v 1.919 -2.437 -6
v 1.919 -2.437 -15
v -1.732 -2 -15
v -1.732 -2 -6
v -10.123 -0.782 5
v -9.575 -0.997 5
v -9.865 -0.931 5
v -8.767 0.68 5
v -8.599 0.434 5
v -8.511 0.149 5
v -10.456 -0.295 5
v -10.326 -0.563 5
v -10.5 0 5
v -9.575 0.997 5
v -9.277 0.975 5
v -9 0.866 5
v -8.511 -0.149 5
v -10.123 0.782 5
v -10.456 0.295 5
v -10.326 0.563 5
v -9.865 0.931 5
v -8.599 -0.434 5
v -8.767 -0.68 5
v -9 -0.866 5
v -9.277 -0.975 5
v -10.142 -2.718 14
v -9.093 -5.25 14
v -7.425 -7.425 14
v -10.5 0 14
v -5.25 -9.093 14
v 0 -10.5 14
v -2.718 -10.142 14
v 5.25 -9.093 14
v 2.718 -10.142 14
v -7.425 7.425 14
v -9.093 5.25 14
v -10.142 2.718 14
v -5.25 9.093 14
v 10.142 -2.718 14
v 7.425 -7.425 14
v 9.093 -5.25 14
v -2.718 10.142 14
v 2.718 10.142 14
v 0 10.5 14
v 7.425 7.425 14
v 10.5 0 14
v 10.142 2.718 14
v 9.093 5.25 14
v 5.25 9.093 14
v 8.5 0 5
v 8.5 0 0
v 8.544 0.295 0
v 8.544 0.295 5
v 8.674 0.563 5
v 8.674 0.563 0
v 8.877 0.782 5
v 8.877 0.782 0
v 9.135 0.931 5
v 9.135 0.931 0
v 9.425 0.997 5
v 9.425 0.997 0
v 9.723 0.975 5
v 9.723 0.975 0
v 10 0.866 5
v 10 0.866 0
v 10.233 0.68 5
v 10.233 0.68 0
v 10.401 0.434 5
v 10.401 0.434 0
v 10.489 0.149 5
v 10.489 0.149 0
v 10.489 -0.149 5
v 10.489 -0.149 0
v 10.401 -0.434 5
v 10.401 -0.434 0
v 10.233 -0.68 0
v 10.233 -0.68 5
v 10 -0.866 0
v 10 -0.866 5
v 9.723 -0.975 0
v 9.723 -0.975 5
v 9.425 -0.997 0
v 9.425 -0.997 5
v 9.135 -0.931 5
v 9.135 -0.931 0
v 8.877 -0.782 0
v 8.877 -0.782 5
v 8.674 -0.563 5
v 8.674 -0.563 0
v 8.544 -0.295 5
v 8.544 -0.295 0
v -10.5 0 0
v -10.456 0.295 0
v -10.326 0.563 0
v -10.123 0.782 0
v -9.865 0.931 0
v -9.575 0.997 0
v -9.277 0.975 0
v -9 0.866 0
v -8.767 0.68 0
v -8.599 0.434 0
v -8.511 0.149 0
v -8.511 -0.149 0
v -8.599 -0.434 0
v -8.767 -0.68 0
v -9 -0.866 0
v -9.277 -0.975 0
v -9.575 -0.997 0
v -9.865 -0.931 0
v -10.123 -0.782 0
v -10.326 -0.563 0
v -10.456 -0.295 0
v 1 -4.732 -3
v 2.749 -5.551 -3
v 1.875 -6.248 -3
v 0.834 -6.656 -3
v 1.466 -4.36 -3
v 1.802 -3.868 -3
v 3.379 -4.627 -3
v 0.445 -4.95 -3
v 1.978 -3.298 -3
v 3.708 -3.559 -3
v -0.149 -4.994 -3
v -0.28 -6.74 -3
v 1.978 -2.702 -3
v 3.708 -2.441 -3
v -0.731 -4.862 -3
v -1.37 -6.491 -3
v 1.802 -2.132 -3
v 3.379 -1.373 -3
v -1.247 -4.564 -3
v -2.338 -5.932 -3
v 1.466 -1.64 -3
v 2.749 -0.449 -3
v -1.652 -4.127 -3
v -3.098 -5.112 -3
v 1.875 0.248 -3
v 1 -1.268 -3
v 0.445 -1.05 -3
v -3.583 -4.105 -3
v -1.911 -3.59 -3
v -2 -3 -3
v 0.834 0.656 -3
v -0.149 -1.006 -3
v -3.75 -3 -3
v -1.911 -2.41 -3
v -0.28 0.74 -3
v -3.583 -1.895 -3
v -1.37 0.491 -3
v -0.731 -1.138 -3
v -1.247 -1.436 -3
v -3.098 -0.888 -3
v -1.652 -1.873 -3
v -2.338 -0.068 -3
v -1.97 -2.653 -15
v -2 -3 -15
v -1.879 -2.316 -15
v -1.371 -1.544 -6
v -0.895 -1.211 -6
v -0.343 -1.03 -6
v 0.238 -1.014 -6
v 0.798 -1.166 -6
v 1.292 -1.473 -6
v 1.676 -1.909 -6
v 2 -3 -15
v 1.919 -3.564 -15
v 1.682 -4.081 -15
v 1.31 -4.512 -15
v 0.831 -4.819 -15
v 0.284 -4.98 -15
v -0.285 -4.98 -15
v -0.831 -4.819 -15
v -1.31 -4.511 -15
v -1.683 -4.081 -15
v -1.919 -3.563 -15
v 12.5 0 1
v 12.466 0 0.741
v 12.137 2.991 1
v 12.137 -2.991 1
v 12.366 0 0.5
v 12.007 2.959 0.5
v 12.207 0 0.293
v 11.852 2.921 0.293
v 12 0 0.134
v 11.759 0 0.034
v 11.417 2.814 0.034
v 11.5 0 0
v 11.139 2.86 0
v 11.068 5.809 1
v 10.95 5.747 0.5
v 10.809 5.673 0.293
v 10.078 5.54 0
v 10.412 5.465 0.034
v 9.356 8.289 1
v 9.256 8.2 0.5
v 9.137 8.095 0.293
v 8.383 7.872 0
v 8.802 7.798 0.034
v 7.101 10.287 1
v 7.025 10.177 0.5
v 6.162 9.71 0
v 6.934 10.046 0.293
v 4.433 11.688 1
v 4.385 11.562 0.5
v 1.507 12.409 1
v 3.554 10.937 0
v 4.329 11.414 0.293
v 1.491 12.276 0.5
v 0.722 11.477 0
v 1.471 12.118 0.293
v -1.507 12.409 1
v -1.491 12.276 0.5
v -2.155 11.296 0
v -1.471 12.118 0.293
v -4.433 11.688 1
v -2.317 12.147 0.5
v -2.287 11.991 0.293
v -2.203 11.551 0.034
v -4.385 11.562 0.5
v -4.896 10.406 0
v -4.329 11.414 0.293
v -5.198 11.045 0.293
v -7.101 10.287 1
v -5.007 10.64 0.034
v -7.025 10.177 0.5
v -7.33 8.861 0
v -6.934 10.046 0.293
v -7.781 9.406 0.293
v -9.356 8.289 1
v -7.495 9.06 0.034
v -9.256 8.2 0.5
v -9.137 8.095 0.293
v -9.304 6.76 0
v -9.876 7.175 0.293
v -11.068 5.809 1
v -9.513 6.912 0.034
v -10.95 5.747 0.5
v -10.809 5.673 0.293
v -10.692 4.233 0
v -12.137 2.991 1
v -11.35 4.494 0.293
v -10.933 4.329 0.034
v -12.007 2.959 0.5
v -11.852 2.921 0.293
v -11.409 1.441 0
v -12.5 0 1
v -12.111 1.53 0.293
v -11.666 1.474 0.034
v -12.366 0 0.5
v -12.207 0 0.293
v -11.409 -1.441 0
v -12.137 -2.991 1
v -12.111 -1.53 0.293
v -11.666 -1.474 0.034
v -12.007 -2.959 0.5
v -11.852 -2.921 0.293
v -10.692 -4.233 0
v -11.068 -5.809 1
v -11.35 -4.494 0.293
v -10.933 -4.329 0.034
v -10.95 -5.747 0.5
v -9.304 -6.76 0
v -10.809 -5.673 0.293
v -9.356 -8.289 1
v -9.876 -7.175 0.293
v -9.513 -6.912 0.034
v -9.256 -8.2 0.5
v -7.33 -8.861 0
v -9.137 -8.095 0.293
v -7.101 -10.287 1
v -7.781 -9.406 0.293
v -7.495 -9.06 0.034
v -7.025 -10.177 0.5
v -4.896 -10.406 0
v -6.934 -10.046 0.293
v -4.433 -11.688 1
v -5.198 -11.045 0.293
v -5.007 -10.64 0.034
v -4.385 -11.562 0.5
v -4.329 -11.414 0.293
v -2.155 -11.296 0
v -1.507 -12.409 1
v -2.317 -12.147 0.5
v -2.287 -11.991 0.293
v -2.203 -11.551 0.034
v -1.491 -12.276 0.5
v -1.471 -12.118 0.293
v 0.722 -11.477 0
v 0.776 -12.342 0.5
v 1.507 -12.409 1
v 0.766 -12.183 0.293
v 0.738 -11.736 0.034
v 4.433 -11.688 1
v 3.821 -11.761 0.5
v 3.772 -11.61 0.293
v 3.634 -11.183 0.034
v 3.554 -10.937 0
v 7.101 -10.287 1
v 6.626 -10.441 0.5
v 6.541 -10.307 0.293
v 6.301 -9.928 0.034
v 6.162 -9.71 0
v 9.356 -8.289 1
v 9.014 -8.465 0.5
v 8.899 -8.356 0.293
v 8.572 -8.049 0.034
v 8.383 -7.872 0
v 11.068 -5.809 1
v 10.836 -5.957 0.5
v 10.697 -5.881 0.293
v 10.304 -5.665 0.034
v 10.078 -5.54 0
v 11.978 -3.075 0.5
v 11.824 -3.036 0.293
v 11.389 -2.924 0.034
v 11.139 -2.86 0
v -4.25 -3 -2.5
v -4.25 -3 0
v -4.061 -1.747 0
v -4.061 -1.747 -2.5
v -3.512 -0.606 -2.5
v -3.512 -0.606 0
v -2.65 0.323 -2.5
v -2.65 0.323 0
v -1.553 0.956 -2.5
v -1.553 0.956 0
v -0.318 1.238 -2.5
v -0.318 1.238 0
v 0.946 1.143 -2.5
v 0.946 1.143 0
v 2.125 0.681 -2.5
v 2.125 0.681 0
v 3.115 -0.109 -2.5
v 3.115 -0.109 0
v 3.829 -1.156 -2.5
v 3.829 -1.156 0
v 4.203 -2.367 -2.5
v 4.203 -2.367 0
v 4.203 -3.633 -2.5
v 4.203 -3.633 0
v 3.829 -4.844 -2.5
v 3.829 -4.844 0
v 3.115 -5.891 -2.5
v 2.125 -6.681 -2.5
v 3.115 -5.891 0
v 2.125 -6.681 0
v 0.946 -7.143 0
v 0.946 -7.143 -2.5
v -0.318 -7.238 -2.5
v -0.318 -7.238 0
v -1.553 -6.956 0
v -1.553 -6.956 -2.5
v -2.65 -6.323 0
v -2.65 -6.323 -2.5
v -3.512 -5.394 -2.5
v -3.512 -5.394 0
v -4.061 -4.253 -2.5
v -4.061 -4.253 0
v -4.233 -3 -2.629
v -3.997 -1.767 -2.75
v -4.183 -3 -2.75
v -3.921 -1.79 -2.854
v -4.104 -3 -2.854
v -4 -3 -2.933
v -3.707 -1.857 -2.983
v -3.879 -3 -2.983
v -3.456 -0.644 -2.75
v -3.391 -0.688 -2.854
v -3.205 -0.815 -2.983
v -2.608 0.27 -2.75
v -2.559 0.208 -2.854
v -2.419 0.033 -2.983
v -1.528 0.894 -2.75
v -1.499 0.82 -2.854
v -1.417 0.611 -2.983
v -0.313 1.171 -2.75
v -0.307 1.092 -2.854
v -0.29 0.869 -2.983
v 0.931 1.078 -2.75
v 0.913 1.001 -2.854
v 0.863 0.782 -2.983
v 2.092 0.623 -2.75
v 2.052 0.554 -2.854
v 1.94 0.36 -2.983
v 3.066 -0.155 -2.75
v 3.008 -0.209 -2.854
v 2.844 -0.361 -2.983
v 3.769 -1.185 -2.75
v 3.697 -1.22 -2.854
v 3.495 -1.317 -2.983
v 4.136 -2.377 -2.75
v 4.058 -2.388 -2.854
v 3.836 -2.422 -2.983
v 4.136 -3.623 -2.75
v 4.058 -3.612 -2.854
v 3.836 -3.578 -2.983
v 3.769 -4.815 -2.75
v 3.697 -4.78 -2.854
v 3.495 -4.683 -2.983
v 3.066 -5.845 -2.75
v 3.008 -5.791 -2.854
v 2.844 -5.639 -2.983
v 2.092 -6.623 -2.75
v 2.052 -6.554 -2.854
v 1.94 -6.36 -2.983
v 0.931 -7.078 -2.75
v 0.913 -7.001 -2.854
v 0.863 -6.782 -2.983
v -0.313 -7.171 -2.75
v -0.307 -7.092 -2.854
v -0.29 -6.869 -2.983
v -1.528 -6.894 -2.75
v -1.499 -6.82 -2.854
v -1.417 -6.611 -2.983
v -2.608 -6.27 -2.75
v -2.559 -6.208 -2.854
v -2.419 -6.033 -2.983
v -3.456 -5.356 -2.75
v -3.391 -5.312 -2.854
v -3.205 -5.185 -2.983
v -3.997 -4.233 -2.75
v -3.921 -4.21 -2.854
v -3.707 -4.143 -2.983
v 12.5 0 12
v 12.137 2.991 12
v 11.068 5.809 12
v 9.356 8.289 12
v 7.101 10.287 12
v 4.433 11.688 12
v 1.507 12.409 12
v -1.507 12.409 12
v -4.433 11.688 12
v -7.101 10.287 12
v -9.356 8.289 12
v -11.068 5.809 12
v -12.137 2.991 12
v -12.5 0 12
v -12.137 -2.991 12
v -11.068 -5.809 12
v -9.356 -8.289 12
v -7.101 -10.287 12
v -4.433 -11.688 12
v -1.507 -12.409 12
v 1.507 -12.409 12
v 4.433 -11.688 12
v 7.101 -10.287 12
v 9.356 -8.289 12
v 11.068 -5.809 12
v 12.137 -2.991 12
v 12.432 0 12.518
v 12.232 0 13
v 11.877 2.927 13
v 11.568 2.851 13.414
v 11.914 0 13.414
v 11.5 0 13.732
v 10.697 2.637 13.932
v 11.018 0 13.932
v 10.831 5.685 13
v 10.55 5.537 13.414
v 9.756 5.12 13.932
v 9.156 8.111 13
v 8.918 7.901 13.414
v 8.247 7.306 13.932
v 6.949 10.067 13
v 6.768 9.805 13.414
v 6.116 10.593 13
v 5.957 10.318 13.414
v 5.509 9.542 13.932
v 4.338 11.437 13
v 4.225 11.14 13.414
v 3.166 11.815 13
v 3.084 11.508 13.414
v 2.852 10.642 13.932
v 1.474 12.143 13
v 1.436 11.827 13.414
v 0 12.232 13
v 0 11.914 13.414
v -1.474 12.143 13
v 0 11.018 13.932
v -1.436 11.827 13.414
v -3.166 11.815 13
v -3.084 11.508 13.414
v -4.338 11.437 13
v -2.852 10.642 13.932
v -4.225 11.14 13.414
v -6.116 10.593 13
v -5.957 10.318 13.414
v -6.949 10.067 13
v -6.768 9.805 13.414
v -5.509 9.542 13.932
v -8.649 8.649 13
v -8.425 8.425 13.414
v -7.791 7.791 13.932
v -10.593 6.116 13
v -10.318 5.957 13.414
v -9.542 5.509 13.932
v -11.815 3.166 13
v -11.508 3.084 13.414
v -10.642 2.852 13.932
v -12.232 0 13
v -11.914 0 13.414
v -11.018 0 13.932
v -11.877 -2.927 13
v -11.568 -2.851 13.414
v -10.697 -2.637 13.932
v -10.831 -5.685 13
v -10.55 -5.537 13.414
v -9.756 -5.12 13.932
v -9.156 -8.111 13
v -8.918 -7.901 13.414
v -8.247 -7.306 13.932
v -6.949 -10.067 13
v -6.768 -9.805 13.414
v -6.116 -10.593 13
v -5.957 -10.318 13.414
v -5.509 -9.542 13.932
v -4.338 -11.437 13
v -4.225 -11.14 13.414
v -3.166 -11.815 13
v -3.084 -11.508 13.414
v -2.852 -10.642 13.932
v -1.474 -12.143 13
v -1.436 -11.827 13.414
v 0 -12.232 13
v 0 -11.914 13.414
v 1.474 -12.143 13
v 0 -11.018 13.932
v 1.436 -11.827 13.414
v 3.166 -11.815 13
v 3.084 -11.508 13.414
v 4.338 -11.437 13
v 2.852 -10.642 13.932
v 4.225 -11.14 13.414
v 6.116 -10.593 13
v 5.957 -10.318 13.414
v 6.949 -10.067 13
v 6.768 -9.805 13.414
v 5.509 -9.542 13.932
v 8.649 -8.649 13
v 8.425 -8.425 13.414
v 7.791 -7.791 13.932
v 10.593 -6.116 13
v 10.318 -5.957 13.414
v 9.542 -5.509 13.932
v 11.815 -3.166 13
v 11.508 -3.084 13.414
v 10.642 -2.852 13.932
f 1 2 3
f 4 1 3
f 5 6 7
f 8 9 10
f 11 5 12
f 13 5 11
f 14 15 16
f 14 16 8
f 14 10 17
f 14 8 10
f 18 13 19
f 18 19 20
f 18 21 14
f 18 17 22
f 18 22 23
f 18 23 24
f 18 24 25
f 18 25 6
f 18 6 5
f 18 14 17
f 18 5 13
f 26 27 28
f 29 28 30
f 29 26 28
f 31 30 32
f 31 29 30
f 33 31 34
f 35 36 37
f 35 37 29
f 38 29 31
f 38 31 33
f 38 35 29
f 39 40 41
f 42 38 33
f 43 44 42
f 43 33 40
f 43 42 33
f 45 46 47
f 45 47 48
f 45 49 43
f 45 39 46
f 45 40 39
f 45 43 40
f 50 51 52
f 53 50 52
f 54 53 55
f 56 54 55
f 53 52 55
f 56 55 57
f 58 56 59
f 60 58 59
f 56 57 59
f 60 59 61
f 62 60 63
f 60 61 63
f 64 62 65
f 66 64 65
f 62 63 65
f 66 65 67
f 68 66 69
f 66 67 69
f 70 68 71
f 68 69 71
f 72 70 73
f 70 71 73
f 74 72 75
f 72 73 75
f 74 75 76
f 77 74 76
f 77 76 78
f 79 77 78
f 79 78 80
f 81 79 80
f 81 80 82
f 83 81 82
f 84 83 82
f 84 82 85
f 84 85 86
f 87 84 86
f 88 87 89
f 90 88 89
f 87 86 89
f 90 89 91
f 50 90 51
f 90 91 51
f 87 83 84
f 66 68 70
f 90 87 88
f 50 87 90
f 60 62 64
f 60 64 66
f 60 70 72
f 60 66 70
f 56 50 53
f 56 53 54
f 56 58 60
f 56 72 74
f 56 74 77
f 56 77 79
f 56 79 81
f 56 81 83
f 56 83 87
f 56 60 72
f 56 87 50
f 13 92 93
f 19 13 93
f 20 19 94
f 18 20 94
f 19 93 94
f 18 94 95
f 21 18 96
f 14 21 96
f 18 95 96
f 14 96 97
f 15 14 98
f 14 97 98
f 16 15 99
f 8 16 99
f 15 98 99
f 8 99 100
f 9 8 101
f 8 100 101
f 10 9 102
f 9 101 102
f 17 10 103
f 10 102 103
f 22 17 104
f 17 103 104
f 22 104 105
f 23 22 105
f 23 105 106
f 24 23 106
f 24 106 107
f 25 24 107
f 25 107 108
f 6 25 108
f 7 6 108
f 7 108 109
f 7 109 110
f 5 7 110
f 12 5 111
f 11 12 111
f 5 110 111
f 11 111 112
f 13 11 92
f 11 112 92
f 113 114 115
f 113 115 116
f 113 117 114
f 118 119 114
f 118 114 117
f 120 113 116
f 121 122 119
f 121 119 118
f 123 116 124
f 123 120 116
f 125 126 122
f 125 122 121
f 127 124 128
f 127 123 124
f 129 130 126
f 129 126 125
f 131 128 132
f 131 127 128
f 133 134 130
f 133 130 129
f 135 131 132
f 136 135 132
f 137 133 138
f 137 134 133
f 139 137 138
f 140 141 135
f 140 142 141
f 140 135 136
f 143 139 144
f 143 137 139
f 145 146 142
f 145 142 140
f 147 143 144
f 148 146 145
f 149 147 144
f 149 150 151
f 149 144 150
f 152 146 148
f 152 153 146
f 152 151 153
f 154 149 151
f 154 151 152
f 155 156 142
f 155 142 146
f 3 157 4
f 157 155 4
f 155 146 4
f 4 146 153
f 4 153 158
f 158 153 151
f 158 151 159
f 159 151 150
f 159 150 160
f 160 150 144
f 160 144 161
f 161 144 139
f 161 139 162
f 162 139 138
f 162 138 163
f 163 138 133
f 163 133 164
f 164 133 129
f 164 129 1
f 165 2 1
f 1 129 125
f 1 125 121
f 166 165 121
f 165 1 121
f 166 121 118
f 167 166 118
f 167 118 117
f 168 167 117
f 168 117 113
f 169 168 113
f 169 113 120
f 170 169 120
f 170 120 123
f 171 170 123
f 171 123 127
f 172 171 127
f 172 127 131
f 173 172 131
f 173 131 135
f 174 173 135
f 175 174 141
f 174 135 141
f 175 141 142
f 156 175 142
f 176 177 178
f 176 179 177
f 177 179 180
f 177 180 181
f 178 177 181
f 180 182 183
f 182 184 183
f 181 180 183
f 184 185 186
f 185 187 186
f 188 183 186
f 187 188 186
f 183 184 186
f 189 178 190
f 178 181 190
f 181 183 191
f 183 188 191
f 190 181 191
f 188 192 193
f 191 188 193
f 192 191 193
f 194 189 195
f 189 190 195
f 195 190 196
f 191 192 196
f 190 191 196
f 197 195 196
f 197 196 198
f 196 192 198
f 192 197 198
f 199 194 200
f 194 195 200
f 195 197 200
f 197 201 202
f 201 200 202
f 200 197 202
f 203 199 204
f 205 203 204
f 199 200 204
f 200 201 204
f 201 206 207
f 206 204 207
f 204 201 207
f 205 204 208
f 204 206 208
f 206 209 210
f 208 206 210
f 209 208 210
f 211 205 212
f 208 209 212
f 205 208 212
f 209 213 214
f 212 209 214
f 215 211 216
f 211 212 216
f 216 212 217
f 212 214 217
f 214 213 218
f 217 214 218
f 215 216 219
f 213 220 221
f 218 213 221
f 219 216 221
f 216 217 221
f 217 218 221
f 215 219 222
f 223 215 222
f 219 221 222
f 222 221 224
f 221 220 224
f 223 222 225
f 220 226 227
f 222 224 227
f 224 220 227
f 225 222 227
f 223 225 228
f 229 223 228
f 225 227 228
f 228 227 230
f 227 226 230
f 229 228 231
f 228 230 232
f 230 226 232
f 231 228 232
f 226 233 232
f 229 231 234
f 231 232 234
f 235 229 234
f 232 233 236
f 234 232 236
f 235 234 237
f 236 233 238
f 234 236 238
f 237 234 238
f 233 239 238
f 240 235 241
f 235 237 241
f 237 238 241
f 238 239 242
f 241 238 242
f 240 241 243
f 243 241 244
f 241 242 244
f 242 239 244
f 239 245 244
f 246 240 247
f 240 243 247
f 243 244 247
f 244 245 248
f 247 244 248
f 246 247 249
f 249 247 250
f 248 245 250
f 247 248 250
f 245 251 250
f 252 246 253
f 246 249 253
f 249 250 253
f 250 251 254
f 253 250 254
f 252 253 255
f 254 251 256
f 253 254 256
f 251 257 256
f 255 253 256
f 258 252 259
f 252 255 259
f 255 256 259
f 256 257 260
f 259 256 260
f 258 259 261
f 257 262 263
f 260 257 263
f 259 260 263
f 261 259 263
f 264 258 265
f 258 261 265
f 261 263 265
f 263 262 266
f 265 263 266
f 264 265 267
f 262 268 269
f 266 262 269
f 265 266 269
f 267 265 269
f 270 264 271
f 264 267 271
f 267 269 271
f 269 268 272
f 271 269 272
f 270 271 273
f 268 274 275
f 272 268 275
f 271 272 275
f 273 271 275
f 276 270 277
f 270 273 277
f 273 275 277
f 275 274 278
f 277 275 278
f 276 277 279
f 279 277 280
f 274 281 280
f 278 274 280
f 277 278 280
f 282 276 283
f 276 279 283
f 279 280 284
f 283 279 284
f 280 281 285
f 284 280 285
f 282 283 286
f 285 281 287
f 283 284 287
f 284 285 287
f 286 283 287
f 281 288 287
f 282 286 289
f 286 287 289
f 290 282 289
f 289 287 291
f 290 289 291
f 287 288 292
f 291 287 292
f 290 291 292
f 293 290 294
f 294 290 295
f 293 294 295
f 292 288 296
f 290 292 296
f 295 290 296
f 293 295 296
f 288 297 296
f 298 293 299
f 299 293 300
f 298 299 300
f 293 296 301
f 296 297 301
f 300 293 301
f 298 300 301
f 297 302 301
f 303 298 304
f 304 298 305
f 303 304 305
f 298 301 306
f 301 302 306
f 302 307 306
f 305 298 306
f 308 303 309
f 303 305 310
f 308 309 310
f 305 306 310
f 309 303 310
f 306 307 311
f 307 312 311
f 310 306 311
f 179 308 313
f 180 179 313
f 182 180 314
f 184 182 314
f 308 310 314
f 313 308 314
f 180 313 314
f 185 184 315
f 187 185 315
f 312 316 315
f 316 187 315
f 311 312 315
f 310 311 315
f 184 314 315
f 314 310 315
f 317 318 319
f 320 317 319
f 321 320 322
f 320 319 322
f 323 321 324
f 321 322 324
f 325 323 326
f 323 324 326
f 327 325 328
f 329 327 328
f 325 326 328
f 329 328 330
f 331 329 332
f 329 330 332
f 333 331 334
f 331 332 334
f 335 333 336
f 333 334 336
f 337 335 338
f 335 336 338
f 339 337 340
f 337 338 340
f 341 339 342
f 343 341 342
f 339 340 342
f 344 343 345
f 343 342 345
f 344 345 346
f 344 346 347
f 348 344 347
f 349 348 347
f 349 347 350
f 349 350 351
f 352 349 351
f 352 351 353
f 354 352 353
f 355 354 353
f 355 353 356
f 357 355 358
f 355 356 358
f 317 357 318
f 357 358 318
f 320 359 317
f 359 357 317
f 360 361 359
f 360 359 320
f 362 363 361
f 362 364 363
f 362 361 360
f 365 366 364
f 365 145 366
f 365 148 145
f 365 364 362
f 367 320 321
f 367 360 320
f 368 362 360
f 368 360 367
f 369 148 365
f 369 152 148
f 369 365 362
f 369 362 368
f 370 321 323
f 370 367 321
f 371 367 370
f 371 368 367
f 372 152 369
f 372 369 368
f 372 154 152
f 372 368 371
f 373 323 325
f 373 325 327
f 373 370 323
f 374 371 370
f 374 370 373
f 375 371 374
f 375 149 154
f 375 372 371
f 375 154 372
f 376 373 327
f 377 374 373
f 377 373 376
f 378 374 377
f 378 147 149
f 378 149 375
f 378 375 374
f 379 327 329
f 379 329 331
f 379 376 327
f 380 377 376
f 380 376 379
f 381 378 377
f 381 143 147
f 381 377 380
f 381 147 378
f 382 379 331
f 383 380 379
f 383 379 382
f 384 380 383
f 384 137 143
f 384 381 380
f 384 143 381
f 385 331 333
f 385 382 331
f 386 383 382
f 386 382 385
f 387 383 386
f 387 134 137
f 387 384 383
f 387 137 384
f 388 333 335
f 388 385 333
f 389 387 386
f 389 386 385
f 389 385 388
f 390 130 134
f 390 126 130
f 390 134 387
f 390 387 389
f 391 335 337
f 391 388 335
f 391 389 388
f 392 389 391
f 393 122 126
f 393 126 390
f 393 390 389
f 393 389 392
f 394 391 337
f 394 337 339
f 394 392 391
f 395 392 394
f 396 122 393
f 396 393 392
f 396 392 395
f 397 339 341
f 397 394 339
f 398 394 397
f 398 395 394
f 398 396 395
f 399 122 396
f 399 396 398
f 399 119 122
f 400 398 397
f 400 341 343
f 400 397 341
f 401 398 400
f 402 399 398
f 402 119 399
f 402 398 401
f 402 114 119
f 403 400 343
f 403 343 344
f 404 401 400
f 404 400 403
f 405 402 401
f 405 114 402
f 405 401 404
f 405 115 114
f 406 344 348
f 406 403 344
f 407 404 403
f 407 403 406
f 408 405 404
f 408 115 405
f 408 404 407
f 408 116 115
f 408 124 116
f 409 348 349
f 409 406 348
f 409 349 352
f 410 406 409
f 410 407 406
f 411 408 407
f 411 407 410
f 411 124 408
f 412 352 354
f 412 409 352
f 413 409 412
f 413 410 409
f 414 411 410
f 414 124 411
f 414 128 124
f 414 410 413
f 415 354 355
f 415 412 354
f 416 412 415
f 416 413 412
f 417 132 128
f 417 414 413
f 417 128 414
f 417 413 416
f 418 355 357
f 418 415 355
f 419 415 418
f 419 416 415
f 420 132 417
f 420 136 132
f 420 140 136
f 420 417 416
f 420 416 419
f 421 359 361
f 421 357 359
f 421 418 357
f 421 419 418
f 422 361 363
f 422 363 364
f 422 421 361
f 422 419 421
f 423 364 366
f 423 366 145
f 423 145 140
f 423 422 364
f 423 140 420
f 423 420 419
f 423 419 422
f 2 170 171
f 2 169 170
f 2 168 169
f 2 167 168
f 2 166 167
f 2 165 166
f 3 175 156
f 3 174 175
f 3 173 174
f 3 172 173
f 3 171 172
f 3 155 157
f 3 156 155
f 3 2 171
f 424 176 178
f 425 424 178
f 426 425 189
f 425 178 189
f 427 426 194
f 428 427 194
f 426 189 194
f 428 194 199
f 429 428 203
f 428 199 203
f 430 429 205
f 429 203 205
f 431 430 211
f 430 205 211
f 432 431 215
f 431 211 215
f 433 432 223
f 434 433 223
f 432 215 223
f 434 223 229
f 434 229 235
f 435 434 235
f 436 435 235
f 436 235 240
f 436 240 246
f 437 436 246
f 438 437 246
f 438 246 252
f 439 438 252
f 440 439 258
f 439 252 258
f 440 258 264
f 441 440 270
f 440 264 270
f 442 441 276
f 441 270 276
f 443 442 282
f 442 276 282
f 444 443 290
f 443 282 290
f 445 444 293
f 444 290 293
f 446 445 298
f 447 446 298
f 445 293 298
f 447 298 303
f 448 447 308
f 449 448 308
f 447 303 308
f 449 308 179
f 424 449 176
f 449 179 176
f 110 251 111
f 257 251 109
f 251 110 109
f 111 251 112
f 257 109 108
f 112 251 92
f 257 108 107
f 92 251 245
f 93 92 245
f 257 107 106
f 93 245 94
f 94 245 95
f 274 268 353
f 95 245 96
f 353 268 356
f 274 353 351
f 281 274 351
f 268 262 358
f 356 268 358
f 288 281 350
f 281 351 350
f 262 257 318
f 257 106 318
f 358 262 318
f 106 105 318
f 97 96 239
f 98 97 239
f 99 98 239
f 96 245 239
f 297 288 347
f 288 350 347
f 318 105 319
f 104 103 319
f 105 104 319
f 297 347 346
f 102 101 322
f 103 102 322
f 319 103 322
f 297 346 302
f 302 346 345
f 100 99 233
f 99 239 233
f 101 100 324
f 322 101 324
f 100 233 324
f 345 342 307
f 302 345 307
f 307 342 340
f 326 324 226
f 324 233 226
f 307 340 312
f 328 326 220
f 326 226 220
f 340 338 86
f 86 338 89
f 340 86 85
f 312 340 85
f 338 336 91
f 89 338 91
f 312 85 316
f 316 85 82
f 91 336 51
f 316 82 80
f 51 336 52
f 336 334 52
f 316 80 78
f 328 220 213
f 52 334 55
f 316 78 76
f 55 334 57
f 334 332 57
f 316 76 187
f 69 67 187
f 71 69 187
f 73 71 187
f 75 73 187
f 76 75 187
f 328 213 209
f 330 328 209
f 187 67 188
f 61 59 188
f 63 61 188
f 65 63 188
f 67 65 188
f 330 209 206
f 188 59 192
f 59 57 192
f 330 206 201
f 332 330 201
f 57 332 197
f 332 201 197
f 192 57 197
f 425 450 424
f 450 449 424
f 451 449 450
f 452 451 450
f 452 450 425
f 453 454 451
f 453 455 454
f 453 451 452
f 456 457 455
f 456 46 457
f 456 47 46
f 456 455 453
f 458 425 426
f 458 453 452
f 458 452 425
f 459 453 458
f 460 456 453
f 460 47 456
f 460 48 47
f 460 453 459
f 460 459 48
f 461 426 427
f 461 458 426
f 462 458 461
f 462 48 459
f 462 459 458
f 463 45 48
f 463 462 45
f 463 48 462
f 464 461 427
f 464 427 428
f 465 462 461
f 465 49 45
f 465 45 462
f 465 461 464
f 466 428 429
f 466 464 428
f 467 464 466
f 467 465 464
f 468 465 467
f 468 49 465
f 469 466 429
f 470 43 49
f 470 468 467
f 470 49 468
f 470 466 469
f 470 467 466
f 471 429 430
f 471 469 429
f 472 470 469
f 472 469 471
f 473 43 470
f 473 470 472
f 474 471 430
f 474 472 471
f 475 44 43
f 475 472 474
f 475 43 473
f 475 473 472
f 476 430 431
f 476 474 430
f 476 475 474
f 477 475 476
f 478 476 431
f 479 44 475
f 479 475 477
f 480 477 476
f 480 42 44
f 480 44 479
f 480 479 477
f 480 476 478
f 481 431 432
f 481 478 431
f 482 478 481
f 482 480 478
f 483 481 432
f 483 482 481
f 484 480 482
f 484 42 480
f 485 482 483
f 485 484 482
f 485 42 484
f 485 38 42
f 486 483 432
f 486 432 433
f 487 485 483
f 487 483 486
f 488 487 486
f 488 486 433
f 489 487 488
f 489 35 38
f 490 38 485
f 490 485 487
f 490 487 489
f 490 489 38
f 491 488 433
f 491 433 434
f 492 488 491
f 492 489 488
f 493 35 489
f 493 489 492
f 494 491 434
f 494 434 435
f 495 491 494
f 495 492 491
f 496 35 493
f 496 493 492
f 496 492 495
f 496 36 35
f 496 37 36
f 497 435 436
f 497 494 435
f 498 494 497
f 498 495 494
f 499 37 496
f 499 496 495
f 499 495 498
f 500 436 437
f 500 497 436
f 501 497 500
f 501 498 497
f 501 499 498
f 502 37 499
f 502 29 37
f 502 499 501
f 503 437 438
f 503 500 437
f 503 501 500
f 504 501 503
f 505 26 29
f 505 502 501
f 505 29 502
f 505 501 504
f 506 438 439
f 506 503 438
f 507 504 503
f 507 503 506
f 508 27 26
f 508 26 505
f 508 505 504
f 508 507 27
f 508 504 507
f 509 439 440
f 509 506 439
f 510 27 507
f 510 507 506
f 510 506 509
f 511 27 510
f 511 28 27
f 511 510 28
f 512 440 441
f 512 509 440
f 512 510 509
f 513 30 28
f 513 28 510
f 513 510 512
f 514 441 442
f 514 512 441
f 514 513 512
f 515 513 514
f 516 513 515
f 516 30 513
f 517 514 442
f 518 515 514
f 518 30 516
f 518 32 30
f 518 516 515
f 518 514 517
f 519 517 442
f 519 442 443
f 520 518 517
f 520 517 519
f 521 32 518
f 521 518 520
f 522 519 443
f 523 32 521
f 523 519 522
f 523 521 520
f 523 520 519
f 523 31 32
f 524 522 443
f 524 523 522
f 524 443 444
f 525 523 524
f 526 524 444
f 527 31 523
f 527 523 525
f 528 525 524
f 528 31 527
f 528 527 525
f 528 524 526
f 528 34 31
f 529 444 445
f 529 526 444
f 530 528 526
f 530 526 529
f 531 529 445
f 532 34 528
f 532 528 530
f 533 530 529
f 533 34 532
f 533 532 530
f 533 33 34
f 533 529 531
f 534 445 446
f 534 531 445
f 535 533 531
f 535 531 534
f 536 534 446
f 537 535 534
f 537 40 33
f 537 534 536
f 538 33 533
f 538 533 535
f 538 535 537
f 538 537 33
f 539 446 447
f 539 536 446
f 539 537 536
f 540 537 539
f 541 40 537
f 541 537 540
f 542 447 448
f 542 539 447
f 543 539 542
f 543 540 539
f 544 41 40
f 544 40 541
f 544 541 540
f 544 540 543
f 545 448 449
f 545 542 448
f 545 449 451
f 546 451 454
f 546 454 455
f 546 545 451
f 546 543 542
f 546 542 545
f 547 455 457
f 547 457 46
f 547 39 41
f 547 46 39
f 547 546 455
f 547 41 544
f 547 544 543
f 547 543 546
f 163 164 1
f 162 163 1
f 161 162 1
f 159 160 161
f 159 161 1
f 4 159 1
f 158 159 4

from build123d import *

# Parameters (mm, degrees)
SKETCH1_R               = 12.5
BOSS_EXTRUDE1_DEPTH     = 14
FILLET2_R               = 1
SKETCH6_R               = 1
CUT_EXTRUDE2_DEPTH      = 5
SKETCH7_R               = 4.25
BOSS_EXTRUDE5_DEPTH     = 3
FILLET4_R               = 0.5
SKETCH8_R               = 2
BOSS_EXTRUDE6_DEPTH     = 12
CUT_EXTRUDE3_DEPTH      = 1
CUT_EXTRUDE3_DEPTH_BACK = 9
FILLET5_R               = 2


with BuildPart() as part:
    # Sketch1 → Boss-Extrude1 (new body)
    with BuildSketch(Plane.XY):
        Circle(SKETCH1_R)
    extrude(amount=BOSS_EXTRUDE1_DEPTH)

    # Fillet2
    fillet2_edges = [part.edges().sort_by_distance(p)[0] for p in [
        (-12.5, 0, 0),
    ]]
    fillet(fillet2_edges, radius=FILLET2_R)

    # Sketch6 → Cut-Extrude2 (cut)
    with BuildSketch(Plane(origin=(0, 0, 0), x_dir=(-1, 0, 0), z_dir=(0, 0, -1))):
        with Locations((-9.5, 0)):
            Circle(SKETCH6_R)
        with Locations((9.5, 0)):
            Circle(SKETCH6_R)
    extrude(amount=-CUT_EXTRUDE2_DEPTH, mode=Mode.SUBTRACT)

    # Sketch7 → Boss-Extrude5 (add)
    with BuildSketch(Plane(origin=(0, 0, 0), x_dir=(-1, 0, 0), z_dir=(0, 0, -1))):
        with Locations((0, -3)):
            Circle(SKETCH7_R)
    extrude(amount=BOSS_EXTRUDE5_DEPTH)

    # Fillet4
    fillet4_edges = [part.edges().sort_by_distance(p)[0] for p in [
        (4.25, -3, -3),
    ]]
    fillet(fillet4_edges, radius=FILLET4_R)

    # Sketch8 → Boss-Extrude6 (add)
    with BuildSketch(Plane(origin=(0, 0, -3), x_dir=(-1, 0, 0), z_dir=(0, 0, -1))):
        with Locations((0, -3)):
            Circle(SKETCH8_R)
    extrude(amount=BOSS_EXTRUDE6_DEPTH)

    # Sketch9 → Cut-Extrude3 (cut, two sides)
    with BuildSketch(Plane(origin=(0, 0, -15), x_dir=(-1, 0, 0), z_dir=(0, 0, -1))) as cut_extrude3_sk:
        Polygon((-53.075925999, -8.559326208), (-1.919066235, -2.436808394), (1.731963356, -1.999848545), (52.88882312, 4.122669269), (40.643787491, 106.436388797), (-65.320961628, 93.754393319), align=None)
    extrude(amount=CUT_EXTRUDE3_DEPTH, mode=Mode.SUBTRACT)
    extrude(cut_extrude3_sk.sketch, amount=-CUT_EXTRUDE3_DEPTH_BACK, mode=Mode.SUBTRACT)

    # Fillet5
    fillet5_edges = [part.edges().sort_by_distance(p)[0] for p in [
        (-12.5, 0, 14),
    ]]
    fillet(fillet5_edges, radius=FILLET5_R)


solid = part.part
